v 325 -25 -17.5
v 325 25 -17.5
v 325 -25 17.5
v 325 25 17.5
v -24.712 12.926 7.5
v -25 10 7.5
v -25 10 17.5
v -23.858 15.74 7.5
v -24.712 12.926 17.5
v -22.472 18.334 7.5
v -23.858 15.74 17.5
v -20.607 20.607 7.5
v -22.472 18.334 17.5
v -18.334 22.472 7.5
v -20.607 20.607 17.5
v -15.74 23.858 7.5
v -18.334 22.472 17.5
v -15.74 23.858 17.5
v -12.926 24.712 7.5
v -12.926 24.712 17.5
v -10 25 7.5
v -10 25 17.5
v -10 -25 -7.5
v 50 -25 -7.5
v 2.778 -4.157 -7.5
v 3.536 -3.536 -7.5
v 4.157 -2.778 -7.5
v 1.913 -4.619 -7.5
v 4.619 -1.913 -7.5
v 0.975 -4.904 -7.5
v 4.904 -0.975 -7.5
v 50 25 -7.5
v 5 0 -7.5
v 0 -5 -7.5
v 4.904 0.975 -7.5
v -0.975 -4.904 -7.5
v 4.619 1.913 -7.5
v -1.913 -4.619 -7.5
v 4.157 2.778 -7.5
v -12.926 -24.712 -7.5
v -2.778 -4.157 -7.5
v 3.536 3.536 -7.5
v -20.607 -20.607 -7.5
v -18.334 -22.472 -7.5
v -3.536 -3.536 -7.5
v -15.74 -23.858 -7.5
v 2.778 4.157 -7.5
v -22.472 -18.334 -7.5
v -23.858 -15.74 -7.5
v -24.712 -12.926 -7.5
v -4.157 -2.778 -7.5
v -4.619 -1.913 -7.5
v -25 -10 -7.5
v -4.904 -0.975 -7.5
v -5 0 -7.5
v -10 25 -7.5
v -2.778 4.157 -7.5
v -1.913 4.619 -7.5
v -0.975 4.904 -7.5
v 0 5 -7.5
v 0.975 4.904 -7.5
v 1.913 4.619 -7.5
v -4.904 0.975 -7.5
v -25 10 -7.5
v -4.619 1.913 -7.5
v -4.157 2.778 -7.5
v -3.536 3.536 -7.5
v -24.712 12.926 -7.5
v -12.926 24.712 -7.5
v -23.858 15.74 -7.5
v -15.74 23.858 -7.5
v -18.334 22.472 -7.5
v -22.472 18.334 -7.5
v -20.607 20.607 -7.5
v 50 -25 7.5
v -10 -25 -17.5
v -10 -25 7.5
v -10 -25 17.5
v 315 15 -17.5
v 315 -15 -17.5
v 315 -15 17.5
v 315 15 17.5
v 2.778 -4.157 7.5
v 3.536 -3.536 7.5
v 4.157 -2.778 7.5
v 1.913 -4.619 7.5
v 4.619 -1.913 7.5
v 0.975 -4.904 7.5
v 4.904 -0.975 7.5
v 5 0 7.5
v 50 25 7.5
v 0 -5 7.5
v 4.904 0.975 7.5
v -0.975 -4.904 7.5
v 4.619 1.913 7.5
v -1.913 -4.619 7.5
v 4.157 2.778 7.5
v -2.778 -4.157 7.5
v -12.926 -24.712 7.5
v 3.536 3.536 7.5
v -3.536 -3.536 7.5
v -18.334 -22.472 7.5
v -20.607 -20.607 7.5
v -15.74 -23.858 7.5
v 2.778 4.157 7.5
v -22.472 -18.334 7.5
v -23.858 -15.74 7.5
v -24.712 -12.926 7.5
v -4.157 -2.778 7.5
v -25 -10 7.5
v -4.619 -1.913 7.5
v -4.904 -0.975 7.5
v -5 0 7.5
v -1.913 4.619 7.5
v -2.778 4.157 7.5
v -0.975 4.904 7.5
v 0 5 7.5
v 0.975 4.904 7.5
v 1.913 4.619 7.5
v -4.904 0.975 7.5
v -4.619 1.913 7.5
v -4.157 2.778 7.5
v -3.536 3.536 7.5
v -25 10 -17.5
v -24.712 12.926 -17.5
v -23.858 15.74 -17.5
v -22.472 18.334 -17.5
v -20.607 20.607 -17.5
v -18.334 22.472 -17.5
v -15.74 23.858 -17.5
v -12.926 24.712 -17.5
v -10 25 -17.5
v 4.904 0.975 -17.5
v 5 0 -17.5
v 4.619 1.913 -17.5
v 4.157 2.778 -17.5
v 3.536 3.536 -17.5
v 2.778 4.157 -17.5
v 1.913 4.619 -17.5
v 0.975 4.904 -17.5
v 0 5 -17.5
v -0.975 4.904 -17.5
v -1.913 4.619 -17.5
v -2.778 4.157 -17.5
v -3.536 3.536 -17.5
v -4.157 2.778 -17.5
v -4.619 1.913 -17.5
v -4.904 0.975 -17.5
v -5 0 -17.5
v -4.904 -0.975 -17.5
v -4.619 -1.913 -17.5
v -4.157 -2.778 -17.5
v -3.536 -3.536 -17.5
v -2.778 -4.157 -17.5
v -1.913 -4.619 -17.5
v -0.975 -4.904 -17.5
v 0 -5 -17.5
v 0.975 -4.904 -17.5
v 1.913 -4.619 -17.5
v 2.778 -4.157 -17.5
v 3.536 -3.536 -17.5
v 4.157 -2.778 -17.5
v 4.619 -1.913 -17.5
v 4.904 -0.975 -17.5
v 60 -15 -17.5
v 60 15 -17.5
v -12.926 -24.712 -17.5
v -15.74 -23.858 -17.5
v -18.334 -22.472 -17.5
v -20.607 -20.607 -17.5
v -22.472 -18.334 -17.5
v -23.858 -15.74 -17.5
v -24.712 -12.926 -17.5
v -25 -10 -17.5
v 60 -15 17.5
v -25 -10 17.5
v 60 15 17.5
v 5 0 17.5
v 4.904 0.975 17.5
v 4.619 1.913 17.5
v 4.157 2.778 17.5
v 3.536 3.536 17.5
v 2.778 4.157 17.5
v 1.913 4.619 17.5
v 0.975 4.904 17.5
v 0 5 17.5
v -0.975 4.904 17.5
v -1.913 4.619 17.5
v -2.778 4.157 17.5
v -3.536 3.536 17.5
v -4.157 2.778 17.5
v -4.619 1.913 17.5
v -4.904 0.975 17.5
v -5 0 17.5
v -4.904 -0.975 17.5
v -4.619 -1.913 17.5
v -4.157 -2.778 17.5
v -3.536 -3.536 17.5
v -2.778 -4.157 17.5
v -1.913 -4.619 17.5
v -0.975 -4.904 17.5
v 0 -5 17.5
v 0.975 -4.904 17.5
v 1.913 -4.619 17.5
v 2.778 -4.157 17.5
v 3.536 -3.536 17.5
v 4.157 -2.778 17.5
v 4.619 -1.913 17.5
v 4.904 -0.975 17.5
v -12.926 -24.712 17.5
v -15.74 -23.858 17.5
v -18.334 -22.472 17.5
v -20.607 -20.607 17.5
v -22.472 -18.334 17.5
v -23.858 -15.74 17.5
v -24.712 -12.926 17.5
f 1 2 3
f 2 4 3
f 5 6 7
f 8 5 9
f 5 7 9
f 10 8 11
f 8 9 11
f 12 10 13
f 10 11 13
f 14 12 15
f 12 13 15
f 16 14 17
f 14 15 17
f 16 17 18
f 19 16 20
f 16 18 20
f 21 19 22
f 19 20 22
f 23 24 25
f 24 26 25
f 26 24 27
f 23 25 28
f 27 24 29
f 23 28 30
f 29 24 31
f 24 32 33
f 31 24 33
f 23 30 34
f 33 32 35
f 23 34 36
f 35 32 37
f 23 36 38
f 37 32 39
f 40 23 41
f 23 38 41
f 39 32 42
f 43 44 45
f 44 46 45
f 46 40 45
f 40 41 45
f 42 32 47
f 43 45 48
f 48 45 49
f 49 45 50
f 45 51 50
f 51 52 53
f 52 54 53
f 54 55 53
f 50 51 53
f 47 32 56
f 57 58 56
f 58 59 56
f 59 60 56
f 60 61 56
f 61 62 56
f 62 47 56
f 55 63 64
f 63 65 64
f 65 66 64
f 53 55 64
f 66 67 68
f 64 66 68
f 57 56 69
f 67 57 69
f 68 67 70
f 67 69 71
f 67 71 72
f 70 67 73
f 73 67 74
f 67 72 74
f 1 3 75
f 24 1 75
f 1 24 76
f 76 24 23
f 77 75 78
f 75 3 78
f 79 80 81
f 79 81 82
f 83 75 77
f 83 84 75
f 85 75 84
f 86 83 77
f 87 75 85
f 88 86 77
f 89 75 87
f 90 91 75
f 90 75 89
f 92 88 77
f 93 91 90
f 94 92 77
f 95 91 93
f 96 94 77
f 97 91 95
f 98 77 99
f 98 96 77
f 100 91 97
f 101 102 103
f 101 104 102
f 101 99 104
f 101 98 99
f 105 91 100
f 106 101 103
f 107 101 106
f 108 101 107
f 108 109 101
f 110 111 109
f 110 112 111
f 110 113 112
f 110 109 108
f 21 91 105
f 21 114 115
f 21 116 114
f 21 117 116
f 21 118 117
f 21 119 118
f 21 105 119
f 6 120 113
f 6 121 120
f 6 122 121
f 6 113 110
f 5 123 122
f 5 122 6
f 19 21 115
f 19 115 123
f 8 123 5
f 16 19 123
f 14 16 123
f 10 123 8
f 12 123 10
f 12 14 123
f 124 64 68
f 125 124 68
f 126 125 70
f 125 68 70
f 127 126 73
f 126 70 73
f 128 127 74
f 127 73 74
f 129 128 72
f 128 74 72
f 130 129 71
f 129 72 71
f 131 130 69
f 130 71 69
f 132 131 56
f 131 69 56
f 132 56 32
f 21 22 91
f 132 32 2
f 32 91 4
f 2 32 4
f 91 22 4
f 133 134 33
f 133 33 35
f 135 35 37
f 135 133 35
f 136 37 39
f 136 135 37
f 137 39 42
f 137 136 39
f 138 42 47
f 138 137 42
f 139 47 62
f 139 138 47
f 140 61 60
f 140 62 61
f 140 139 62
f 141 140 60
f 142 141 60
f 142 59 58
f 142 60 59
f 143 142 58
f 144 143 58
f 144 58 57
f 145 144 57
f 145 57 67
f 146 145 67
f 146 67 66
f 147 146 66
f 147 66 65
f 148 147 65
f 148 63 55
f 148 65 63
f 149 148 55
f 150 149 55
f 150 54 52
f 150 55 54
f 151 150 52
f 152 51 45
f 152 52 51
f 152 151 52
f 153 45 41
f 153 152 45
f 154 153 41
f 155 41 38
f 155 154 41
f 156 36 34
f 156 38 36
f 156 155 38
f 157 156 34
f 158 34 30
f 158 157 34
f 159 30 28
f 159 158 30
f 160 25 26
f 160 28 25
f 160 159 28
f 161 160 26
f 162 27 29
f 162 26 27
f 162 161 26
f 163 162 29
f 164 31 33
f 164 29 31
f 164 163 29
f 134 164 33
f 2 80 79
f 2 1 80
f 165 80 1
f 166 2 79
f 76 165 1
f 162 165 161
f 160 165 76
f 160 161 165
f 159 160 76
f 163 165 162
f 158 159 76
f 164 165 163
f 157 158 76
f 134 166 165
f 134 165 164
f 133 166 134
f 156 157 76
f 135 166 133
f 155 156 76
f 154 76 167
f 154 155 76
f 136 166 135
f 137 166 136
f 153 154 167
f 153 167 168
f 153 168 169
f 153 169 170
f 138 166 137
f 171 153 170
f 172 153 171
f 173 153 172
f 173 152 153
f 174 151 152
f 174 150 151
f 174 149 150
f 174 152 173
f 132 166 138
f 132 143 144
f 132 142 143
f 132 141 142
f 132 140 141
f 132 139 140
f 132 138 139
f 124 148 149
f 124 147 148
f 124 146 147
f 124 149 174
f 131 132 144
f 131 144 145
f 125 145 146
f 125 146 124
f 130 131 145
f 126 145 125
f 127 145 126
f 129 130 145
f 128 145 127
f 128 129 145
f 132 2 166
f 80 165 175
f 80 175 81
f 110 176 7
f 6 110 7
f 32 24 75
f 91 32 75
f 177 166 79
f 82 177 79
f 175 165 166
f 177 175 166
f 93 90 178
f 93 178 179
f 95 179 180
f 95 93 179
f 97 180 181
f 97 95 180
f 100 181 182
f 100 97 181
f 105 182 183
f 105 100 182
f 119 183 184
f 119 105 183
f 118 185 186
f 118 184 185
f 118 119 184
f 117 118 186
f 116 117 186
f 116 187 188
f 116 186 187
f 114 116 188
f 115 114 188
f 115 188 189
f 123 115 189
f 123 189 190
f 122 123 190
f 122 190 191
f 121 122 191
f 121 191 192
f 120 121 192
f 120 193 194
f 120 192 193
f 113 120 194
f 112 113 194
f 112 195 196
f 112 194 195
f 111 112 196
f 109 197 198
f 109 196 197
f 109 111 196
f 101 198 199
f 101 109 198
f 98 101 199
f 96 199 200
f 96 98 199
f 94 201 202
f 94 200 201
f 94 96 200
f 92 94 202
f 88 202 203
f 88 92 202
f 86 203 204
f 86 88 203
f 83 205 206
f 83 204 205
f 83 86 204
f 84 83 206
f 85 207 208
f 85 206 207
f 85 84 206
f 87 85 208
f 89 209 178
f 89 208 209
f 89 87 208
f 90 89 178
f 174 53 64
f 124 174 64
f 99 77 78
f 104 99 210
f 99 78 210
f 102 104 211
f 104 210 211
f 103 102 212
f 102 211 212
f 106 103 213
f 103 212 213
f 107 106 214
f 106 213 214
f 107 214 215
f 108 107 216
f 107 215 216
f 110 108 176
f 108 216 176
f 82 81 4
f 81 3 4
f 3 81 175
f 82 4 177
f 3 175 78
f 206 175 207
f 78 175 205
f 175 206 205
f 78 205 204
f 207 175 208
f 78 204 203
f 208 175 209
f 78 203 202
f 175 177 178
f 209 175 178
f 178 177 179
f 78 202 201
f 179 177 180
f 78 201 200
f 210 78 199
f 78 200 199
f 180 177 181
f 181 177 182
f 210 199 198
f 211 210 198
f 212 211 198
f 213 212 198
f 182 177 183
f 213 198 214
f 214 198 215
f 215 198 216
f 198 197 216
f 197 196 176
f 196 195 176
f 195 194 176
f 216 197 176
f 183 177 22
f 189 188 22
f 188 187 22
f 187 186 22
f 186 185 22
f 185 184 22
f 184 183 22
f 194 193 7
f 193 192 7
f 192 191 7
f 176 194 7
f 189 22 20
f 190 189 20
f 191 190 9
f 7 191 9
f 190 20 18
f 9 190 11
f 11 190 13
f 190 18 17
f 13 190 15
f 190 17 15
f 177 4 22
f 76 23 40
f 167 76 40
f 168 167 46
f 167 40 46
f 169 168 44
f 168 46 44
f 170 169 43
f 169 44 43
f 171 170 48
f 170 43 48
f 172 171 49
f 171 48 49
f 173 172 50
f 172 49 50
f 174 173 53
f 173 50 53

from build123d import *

# Parameters (mm, degrees)
EXTRUDE1_DEPTH          = 17.5
SKETCH2_W               = 75
SKETCH2_H               = 15
CUT_EXTRUDE1_DEPTH      = 330.289006801
CUT_EXTRUDE2_DEPTH      = 327.429548295
CUT_EXTRUDE2_DEPTH_BACK = 327.429548295
SKETCH3_R               = 5
CUT_EXTRUDE3_DEPTH      = 327.429548295
CUT_EXTRUDE3_DEPTH_BACK = 327.429548295
SKETCH4_W               = 255
SKETCH4_H               = 30


with BuildPart() as part:
    # Sketch1 → Extrude1 (new, symmetric)
    with BuildSketch(Plane.XY):
        with BuildLine():
            Line((-10, 25), (325, 25))
            Line((325, 25), (325, -25))
            Line((325, -25), (-10, -25))
            ThreePointArc((-10, -25), (-20.606601718, -20.606601718), (-25, -10))
            Line((-25, -10), (-25, 10))
            ThreePointArc((-25, 10), (-20.606601718, 20.606601718), (-10, 25))
        make_face()
    extrude(amount=EXTRUDE1_DEPTH, both=True)

    # Sketch2 → Cut-Extrude1 (cut, through all)
    with BuildSketch(Plane(origin=(0, 25, 0), x_dir=(-1, 0, 0), z_dir=(0, 1, 0))):
        with Locations((-12.5, 0)):
            Rectangle(SKETCH2_W, SKETCH2_H)
    extrude(amount=-CUT_EXTRUDE1_DEPTH, mode=Mode.SUBTRACT)

    # Sketch3 → Cut-Extrude2 (cut, two sides: drawn at the far end of the back side and taken through both)
    with BuildSketch(Plane.XY.offset(-CUT_EXTRUDE2_DEPTH_BACK)):
        Circle(SKETCH3_R)
    extrude(amount=CUT_EXTRUDE2_DEPTH + CUT_EXTRUDE2_DEPTH_BACK, mode=Mode.SUBTRACT)

    # Sketch4 → Cut-Extrude3 (cut, two sides: drawn at the far end of the back side and taken through both)
    with BuildSketch(Plane.XY.offset(-CUT_EXTRUDE3_DEPTH_BACK)):
        with Locations((187.5, 0)):
            Rectangle(SKETCH4_W, SKETCH4_H)
    extrude(amount=CUT_EXTRUDE3_DEPTH + CUT_EXTRUDE3_DEPTH_BACK, mode=Mode.SUBTRACT)


solid = part.part
